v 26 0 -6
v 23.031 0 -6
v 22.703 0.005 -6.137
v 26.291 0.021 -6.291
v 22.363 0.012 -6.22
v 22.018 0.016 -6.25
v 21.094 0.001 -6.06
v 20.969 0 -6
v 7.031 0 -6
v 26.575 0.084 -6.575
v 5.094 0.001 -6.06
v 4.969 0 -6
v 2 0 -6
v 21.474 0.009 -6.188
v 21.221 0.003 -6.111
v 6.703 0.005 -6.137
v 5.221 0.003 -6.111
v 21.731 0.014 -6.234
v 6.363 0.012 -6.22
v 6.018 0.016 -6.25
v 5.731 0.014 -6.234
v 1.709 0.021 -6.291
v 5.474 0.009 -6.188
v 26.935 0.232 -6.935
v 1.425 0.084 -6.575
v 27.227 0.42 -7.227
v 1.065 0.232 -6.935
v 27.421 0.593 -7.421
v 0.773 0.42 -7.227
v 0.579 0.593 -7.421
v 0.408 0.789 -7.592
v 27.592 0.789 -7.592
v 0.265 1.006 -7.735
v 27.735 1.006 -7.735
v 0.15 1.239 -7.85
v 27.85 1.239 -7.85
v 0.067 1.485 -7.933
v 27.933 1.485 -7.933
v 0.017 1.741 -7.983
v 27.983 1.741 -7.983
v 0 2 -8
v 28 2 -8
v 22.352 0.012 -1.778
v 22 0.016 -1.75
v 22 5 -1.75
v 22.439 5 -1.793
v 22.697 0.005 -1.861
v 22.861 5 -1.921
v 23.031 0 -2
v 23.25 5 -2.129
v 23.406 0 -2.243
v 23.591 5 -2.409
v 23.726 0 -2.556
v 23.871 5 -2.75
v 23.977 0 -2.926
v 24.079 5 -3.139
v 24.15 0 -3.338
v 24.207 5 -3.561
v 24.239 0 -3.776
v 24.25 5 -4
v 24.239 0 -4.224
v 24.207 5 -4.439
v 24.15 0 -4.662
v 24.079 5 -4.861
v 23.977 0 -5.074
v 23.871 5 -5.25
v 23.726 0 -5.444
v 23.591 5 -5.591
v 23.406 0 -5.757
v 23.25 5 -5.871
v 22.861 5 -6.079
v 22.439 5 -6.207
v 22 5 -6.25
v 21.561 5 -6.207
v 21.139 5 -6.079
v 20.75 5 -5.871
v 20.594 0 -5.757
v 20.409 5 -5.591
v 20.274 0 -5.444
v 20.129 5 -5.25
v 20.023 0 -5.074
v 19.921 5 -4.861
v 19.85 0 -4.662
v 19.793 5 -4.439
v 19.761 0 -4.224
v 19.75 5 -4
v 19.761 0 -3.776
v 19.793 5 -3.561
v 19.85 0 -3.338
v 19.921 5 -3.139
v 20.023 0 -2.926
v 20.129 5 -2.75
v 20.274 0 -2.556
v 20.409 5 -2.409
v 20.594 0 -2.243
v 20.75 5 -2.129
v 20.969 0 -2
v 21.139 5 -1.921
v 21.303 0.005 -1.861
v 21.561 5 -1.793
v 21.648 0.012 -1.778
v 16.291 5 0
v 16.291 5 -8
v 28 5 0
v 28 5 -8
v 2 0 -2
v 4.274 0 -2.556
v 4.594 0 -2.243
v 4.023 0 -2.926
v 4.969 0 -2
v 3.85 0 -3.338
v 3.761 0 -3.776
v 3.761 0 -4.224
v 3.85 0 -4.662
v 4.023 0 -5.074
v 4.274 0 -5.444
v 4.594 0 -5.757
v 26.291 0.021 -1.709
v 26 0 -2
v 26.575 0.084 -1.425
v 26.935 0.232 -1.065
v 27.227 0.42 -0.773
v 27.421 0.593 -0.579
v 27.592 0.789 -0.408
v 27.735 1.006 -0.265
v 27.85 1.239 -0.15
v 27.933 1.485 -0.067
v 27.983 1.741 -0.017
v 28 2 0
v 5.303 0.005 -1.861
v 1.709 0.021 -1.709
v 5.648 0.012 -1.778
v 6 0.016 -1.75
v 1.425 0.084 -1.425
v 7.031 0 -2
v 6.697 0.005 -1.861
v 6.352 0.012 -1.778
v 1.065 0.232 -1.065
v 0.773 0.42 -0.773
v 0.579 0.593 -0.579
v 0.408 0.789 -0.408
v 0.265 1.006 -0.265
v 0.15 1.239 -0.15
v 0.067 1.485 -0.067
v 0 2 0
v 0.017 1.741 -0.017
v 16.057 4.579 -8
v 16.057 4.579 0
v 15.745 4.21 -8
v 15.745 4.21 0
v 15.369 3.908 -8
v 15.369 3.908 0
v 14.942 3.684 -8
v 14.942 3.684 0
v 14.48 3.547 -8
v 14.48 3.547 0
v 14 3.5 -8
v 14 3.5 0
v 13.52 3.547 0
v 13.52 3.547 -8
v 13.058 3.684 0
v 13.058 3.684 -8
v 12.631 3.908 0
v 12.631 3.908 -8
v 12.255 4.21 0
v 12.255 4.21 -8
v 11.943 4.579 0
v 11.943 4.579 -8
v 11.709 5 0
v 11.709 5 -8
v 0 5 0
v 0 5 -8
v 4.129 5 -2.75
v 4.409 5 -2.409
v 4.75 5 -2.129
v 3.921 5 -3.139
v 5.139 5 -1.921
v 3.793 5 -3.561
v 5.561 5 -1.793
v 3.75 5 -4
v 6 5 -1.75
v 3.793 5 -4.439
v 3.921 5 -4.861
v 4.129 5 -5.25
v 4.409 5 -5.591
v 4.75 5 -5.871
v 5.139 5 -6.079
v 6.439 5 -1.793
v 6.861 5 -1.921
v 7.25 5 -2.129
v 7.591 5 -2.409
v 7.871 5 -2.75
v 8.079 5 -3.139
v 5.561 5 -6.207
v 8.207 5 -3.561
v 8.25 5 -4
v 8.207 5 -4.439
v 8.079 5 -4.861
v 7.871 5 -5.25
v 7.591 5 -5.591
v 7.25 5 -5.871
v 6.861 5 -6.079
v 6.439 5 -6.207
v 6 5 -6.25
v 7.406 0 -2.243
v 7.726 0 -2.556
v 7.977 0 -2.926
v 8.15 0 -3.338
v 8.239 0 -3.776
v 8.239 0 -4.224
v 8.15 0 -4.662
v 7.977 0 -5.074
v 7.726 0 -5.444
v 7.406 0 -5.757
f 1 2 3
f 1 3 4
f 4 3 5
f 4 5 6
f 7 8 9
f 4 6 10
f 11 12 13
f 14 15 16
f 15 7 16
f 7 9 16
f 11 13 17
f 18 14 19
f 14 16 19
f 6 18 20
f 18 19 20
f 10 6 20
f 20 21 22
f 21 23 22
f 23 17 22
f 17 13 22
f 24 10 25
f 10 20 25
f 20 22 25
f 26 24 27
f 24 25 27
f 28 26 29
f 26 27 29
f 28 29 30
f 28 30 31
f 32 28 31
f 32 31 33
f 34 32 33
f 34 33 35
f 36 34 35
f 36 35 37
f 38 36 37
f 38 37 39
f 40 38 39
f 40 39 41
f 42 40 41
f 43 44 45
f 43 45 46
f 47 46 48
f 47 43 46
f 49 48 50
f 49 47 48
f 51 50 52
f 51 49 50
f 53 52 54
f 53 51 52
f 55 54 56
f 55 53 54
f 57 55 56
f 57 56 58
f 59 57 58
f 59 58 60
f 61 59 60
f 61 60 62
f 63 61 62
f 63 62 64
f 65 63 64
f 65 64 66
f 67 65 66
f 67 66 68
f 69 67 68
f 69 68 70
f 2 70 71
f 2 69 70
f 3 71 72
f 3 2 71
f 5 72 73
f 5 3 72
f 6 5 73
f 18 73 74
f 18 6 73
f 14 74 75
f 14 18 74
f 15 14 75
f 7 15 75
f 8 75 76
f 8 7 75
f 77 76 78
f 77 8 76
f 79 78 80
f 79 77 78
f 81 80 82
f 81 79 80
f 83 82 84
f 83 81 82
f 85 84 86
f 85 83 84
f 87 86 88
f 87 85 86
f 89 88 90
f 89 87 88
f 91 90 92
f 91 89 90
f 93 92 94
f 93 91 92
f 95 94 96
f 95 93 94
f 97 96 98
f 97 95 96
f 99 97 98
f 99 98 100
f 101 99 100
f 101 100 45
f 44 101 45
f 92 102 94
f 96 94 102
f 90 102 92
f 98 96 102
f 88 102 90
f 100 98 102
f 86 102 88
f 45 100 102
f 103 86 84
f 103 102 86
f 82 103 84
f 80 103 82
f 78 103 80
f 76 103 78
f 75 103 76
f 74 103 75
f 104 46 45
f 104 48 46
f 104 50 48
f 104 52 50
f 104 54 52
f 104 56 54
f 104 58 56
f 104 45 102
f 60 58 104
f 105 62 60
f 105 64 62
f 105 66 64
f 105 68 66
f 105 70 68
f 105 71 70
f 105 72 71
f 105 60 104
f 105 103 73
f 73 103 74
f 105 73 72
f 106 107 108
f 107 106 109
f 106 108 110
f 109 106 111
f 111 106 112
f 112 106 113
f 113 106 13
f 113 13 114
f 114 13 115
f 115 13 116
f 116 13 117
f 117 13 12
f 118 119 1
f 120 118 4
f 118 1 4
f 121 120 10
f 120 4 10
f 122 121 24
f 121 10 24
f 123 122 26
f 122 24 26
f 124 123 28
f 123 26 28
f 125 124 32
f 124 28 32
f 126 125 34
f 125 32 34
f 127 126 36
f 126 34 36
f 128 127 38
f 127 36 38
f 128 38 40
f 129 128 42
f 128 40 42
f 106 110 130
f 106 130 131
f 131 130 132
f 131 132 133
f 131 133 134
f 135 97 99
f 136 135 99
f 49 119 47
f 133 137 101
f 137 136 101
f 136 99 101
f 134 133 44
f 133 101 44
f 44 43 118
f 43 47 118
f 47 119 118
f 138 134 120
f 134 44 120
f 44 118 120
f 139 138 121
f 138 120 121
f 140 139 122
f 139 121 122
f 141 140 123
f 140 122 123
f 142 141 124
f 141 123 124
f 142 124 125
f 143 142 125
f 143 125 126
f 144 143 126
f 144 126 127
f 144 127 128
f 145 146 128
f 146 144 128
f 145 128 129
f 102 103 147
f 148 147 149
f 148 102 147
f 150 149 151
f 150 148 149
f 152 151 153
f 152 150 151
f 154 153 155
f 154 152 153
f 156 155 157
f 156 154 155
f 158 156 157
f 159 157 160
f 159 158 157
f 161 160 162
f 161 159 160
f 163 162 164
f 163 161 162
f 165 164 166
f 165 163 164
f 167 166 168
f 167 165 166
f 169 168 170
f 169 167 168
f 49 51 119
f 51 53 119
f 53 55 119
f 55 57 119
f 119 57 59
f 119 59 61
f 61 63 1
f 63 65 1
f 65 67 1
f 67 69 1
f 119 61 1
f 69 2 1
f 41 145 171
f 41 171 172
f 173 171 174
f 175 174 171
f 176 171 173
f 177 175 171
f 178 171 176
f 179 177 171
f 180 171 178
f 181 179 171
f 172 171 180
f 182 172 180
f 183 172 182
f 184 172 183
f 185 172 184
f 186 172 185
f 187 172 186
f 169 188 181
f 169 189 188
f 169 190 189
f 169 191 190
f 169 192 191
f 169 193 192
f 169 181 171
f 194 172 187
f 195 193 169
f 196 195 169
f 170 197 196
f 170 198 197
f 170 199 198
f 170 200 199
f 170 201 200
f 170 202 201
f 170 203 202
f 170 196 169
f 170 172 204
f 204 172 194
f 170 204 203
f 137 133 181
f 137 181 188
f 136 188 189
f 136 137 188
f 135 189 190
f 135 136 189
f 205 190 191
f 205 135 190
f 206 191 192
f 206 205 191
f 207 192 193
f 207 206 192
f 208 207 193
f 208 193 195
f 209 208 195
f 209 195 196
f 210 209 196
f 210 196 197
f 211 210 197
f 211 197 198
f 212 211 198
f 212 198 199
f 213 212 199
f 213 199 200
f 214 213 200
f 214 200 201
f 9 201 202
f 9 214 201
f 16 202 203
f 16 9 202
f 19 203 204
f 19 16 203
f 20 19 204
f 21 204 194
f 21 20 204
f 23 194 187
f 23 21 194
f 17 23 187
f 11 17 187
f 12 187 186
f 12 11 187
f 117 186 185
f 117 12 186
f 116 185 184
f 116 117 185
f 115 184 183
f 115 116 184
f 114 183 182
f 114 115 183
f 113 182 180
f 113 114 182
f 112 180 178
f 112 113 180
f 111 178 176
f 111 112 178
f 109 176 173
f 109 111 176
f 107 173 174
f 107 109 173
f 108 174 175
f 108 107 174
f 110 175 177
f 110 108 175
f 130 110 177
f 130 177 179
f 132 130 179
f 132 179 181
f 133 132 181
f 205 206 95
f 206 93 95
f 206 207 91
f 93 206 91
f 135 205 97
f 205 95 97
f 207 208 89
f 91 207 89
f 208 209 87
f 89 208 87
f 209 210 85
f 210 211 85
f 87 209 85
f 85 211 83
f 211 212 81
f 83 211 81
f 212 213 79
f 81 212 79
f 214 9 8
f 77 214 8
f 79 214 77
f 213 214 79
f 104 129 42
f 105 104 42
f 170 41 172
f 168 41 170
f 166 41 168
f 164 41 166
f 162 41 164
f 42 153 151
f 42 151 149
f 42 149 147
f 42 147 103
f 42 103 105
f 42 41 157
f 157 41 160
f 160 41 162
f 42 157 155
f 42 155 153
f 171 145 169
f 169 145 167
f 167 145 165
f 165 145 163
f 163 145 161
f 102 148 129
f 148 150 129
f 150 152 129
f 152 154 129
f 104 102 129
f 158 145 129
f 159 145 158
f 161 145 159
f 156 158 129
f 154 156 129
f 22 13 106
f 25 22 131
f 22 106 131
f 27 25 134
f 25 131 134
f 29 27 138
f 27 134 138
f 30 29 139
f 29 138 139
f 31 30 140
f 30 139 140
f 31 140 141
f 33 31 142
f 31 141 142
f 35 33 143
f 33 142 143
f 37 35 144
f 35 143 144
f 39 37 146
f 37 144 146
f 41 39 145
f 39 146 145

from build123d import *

# Parameters (mm, degrees)
SKETCH1_W           = 28
SKETCH1_H           = 8
SKETCH1_R           = 2.25
BOSS_EXTRUDE1_DEPTH = 5
CUT_EXTRUDE1_REACH  = 31.547
FILLET1_R           = 2


with BuildPart() as part:
    # Sketch1 → Boss-Extrude1 (new body)
    with BuildSketch(Plane(origin=(0, 0, 0), x_dir=(1, 0, 0), z_dir=(0, 1, 0))):
        with Locations((14, 4)):
            Rectangle(SKETCH1_W, SKETCH1_H)
        with Locations(Location((6, 4, 0), (0, 0, 270))):
            Circle(SKETCH1_R, mode=Mode.SUBTRACT)
        with Locations(Location((22, 4, 0), (0, 0, 270))):
            Circle(SKETCH1_R, mode=Mode.SUBTRACT)
    extrude(amount=BOSS_EXTRUDE1_DEPTH)

    # Sketch2 → Cut-Extrude1 (cut, up to next)
    with BuildSketch(Plane.XY, mode=Mode.PRIVATE) as cut_extrude1_sk1:
        with BuildLine():
            Line((11.5, 6), (16.5, 6))
            ThreePointArc((16.5, 6), (14, 3.5), (11.5, 6))
        make_face()
    cut_extrude1_tool1 = extrude(cut_extrude1_sk1.sketch, amount=-CUT_EXTRUDE1_REACH, mode=Mode.PRIVATE) & part.part
    add(cut_extrude1_tool1.solids().sort_by_distance((14, 4.938967, 0))[0], mode=Mode.SUBTRACT)

    # Fillet1
    # the kernel refuses this fillet: 2 mm, written as the material it takes off along each edge
    with BuildSketch(Plane(origin=(-5, 0, -8), x_dir=(0, 1, 0), z_dir=(1, 0, 0))) as fillet1_piece_1:
        with BuildLine():
            CenterArc((FILLET1_R, FILLET1_R), FILLET1_R, 180, 90)
            Line((0, FILLET1_R), (0, 0))
            Line((0, 0), (FILLET1_R, 0))
        make_face()
    extrude(amount=38, mode=Mode.SUBTRACT)
    with BuildSketch(Plane(origin=(28, 0, -13), x_dir=(-1, 0, 0), z_dir=(0, 0, 1)), Plane(origin=(0, 0, 5), x_dir=(1, 0, 0), z_dir=(0, 0, -1))) as fillet1_piece_2:
        with BuildLine():
            CenterArc((FILLET1_R, -FILLET1_R), FILLET1_R, 90, 90)
            Line((0, -FILLET1_R), (0, 0))
            Line((0, 0), (FILLET1_R, 0))
        make_face()
    extrude(amount=18, mode=Mode.SUBTRACT)
    with BuildSketch(Plane(origin=(33, 0, 0), x_dir=(0, 0, -1), z_dir=(-1, 0, 0))) as fillet1_piece_3:
        with BuildLine():
            CenterArc((FILLET1_R, -FILLET1_R), FILLET1_R, 90, 90)
            Line((0, -FILLET1_R), (0, 0))
            Line((0, 0), (FILLET1_R, 0))
        make_face()
    extrude(amount=38, mode=Mode.SUBTRACT)


solid = part.part
